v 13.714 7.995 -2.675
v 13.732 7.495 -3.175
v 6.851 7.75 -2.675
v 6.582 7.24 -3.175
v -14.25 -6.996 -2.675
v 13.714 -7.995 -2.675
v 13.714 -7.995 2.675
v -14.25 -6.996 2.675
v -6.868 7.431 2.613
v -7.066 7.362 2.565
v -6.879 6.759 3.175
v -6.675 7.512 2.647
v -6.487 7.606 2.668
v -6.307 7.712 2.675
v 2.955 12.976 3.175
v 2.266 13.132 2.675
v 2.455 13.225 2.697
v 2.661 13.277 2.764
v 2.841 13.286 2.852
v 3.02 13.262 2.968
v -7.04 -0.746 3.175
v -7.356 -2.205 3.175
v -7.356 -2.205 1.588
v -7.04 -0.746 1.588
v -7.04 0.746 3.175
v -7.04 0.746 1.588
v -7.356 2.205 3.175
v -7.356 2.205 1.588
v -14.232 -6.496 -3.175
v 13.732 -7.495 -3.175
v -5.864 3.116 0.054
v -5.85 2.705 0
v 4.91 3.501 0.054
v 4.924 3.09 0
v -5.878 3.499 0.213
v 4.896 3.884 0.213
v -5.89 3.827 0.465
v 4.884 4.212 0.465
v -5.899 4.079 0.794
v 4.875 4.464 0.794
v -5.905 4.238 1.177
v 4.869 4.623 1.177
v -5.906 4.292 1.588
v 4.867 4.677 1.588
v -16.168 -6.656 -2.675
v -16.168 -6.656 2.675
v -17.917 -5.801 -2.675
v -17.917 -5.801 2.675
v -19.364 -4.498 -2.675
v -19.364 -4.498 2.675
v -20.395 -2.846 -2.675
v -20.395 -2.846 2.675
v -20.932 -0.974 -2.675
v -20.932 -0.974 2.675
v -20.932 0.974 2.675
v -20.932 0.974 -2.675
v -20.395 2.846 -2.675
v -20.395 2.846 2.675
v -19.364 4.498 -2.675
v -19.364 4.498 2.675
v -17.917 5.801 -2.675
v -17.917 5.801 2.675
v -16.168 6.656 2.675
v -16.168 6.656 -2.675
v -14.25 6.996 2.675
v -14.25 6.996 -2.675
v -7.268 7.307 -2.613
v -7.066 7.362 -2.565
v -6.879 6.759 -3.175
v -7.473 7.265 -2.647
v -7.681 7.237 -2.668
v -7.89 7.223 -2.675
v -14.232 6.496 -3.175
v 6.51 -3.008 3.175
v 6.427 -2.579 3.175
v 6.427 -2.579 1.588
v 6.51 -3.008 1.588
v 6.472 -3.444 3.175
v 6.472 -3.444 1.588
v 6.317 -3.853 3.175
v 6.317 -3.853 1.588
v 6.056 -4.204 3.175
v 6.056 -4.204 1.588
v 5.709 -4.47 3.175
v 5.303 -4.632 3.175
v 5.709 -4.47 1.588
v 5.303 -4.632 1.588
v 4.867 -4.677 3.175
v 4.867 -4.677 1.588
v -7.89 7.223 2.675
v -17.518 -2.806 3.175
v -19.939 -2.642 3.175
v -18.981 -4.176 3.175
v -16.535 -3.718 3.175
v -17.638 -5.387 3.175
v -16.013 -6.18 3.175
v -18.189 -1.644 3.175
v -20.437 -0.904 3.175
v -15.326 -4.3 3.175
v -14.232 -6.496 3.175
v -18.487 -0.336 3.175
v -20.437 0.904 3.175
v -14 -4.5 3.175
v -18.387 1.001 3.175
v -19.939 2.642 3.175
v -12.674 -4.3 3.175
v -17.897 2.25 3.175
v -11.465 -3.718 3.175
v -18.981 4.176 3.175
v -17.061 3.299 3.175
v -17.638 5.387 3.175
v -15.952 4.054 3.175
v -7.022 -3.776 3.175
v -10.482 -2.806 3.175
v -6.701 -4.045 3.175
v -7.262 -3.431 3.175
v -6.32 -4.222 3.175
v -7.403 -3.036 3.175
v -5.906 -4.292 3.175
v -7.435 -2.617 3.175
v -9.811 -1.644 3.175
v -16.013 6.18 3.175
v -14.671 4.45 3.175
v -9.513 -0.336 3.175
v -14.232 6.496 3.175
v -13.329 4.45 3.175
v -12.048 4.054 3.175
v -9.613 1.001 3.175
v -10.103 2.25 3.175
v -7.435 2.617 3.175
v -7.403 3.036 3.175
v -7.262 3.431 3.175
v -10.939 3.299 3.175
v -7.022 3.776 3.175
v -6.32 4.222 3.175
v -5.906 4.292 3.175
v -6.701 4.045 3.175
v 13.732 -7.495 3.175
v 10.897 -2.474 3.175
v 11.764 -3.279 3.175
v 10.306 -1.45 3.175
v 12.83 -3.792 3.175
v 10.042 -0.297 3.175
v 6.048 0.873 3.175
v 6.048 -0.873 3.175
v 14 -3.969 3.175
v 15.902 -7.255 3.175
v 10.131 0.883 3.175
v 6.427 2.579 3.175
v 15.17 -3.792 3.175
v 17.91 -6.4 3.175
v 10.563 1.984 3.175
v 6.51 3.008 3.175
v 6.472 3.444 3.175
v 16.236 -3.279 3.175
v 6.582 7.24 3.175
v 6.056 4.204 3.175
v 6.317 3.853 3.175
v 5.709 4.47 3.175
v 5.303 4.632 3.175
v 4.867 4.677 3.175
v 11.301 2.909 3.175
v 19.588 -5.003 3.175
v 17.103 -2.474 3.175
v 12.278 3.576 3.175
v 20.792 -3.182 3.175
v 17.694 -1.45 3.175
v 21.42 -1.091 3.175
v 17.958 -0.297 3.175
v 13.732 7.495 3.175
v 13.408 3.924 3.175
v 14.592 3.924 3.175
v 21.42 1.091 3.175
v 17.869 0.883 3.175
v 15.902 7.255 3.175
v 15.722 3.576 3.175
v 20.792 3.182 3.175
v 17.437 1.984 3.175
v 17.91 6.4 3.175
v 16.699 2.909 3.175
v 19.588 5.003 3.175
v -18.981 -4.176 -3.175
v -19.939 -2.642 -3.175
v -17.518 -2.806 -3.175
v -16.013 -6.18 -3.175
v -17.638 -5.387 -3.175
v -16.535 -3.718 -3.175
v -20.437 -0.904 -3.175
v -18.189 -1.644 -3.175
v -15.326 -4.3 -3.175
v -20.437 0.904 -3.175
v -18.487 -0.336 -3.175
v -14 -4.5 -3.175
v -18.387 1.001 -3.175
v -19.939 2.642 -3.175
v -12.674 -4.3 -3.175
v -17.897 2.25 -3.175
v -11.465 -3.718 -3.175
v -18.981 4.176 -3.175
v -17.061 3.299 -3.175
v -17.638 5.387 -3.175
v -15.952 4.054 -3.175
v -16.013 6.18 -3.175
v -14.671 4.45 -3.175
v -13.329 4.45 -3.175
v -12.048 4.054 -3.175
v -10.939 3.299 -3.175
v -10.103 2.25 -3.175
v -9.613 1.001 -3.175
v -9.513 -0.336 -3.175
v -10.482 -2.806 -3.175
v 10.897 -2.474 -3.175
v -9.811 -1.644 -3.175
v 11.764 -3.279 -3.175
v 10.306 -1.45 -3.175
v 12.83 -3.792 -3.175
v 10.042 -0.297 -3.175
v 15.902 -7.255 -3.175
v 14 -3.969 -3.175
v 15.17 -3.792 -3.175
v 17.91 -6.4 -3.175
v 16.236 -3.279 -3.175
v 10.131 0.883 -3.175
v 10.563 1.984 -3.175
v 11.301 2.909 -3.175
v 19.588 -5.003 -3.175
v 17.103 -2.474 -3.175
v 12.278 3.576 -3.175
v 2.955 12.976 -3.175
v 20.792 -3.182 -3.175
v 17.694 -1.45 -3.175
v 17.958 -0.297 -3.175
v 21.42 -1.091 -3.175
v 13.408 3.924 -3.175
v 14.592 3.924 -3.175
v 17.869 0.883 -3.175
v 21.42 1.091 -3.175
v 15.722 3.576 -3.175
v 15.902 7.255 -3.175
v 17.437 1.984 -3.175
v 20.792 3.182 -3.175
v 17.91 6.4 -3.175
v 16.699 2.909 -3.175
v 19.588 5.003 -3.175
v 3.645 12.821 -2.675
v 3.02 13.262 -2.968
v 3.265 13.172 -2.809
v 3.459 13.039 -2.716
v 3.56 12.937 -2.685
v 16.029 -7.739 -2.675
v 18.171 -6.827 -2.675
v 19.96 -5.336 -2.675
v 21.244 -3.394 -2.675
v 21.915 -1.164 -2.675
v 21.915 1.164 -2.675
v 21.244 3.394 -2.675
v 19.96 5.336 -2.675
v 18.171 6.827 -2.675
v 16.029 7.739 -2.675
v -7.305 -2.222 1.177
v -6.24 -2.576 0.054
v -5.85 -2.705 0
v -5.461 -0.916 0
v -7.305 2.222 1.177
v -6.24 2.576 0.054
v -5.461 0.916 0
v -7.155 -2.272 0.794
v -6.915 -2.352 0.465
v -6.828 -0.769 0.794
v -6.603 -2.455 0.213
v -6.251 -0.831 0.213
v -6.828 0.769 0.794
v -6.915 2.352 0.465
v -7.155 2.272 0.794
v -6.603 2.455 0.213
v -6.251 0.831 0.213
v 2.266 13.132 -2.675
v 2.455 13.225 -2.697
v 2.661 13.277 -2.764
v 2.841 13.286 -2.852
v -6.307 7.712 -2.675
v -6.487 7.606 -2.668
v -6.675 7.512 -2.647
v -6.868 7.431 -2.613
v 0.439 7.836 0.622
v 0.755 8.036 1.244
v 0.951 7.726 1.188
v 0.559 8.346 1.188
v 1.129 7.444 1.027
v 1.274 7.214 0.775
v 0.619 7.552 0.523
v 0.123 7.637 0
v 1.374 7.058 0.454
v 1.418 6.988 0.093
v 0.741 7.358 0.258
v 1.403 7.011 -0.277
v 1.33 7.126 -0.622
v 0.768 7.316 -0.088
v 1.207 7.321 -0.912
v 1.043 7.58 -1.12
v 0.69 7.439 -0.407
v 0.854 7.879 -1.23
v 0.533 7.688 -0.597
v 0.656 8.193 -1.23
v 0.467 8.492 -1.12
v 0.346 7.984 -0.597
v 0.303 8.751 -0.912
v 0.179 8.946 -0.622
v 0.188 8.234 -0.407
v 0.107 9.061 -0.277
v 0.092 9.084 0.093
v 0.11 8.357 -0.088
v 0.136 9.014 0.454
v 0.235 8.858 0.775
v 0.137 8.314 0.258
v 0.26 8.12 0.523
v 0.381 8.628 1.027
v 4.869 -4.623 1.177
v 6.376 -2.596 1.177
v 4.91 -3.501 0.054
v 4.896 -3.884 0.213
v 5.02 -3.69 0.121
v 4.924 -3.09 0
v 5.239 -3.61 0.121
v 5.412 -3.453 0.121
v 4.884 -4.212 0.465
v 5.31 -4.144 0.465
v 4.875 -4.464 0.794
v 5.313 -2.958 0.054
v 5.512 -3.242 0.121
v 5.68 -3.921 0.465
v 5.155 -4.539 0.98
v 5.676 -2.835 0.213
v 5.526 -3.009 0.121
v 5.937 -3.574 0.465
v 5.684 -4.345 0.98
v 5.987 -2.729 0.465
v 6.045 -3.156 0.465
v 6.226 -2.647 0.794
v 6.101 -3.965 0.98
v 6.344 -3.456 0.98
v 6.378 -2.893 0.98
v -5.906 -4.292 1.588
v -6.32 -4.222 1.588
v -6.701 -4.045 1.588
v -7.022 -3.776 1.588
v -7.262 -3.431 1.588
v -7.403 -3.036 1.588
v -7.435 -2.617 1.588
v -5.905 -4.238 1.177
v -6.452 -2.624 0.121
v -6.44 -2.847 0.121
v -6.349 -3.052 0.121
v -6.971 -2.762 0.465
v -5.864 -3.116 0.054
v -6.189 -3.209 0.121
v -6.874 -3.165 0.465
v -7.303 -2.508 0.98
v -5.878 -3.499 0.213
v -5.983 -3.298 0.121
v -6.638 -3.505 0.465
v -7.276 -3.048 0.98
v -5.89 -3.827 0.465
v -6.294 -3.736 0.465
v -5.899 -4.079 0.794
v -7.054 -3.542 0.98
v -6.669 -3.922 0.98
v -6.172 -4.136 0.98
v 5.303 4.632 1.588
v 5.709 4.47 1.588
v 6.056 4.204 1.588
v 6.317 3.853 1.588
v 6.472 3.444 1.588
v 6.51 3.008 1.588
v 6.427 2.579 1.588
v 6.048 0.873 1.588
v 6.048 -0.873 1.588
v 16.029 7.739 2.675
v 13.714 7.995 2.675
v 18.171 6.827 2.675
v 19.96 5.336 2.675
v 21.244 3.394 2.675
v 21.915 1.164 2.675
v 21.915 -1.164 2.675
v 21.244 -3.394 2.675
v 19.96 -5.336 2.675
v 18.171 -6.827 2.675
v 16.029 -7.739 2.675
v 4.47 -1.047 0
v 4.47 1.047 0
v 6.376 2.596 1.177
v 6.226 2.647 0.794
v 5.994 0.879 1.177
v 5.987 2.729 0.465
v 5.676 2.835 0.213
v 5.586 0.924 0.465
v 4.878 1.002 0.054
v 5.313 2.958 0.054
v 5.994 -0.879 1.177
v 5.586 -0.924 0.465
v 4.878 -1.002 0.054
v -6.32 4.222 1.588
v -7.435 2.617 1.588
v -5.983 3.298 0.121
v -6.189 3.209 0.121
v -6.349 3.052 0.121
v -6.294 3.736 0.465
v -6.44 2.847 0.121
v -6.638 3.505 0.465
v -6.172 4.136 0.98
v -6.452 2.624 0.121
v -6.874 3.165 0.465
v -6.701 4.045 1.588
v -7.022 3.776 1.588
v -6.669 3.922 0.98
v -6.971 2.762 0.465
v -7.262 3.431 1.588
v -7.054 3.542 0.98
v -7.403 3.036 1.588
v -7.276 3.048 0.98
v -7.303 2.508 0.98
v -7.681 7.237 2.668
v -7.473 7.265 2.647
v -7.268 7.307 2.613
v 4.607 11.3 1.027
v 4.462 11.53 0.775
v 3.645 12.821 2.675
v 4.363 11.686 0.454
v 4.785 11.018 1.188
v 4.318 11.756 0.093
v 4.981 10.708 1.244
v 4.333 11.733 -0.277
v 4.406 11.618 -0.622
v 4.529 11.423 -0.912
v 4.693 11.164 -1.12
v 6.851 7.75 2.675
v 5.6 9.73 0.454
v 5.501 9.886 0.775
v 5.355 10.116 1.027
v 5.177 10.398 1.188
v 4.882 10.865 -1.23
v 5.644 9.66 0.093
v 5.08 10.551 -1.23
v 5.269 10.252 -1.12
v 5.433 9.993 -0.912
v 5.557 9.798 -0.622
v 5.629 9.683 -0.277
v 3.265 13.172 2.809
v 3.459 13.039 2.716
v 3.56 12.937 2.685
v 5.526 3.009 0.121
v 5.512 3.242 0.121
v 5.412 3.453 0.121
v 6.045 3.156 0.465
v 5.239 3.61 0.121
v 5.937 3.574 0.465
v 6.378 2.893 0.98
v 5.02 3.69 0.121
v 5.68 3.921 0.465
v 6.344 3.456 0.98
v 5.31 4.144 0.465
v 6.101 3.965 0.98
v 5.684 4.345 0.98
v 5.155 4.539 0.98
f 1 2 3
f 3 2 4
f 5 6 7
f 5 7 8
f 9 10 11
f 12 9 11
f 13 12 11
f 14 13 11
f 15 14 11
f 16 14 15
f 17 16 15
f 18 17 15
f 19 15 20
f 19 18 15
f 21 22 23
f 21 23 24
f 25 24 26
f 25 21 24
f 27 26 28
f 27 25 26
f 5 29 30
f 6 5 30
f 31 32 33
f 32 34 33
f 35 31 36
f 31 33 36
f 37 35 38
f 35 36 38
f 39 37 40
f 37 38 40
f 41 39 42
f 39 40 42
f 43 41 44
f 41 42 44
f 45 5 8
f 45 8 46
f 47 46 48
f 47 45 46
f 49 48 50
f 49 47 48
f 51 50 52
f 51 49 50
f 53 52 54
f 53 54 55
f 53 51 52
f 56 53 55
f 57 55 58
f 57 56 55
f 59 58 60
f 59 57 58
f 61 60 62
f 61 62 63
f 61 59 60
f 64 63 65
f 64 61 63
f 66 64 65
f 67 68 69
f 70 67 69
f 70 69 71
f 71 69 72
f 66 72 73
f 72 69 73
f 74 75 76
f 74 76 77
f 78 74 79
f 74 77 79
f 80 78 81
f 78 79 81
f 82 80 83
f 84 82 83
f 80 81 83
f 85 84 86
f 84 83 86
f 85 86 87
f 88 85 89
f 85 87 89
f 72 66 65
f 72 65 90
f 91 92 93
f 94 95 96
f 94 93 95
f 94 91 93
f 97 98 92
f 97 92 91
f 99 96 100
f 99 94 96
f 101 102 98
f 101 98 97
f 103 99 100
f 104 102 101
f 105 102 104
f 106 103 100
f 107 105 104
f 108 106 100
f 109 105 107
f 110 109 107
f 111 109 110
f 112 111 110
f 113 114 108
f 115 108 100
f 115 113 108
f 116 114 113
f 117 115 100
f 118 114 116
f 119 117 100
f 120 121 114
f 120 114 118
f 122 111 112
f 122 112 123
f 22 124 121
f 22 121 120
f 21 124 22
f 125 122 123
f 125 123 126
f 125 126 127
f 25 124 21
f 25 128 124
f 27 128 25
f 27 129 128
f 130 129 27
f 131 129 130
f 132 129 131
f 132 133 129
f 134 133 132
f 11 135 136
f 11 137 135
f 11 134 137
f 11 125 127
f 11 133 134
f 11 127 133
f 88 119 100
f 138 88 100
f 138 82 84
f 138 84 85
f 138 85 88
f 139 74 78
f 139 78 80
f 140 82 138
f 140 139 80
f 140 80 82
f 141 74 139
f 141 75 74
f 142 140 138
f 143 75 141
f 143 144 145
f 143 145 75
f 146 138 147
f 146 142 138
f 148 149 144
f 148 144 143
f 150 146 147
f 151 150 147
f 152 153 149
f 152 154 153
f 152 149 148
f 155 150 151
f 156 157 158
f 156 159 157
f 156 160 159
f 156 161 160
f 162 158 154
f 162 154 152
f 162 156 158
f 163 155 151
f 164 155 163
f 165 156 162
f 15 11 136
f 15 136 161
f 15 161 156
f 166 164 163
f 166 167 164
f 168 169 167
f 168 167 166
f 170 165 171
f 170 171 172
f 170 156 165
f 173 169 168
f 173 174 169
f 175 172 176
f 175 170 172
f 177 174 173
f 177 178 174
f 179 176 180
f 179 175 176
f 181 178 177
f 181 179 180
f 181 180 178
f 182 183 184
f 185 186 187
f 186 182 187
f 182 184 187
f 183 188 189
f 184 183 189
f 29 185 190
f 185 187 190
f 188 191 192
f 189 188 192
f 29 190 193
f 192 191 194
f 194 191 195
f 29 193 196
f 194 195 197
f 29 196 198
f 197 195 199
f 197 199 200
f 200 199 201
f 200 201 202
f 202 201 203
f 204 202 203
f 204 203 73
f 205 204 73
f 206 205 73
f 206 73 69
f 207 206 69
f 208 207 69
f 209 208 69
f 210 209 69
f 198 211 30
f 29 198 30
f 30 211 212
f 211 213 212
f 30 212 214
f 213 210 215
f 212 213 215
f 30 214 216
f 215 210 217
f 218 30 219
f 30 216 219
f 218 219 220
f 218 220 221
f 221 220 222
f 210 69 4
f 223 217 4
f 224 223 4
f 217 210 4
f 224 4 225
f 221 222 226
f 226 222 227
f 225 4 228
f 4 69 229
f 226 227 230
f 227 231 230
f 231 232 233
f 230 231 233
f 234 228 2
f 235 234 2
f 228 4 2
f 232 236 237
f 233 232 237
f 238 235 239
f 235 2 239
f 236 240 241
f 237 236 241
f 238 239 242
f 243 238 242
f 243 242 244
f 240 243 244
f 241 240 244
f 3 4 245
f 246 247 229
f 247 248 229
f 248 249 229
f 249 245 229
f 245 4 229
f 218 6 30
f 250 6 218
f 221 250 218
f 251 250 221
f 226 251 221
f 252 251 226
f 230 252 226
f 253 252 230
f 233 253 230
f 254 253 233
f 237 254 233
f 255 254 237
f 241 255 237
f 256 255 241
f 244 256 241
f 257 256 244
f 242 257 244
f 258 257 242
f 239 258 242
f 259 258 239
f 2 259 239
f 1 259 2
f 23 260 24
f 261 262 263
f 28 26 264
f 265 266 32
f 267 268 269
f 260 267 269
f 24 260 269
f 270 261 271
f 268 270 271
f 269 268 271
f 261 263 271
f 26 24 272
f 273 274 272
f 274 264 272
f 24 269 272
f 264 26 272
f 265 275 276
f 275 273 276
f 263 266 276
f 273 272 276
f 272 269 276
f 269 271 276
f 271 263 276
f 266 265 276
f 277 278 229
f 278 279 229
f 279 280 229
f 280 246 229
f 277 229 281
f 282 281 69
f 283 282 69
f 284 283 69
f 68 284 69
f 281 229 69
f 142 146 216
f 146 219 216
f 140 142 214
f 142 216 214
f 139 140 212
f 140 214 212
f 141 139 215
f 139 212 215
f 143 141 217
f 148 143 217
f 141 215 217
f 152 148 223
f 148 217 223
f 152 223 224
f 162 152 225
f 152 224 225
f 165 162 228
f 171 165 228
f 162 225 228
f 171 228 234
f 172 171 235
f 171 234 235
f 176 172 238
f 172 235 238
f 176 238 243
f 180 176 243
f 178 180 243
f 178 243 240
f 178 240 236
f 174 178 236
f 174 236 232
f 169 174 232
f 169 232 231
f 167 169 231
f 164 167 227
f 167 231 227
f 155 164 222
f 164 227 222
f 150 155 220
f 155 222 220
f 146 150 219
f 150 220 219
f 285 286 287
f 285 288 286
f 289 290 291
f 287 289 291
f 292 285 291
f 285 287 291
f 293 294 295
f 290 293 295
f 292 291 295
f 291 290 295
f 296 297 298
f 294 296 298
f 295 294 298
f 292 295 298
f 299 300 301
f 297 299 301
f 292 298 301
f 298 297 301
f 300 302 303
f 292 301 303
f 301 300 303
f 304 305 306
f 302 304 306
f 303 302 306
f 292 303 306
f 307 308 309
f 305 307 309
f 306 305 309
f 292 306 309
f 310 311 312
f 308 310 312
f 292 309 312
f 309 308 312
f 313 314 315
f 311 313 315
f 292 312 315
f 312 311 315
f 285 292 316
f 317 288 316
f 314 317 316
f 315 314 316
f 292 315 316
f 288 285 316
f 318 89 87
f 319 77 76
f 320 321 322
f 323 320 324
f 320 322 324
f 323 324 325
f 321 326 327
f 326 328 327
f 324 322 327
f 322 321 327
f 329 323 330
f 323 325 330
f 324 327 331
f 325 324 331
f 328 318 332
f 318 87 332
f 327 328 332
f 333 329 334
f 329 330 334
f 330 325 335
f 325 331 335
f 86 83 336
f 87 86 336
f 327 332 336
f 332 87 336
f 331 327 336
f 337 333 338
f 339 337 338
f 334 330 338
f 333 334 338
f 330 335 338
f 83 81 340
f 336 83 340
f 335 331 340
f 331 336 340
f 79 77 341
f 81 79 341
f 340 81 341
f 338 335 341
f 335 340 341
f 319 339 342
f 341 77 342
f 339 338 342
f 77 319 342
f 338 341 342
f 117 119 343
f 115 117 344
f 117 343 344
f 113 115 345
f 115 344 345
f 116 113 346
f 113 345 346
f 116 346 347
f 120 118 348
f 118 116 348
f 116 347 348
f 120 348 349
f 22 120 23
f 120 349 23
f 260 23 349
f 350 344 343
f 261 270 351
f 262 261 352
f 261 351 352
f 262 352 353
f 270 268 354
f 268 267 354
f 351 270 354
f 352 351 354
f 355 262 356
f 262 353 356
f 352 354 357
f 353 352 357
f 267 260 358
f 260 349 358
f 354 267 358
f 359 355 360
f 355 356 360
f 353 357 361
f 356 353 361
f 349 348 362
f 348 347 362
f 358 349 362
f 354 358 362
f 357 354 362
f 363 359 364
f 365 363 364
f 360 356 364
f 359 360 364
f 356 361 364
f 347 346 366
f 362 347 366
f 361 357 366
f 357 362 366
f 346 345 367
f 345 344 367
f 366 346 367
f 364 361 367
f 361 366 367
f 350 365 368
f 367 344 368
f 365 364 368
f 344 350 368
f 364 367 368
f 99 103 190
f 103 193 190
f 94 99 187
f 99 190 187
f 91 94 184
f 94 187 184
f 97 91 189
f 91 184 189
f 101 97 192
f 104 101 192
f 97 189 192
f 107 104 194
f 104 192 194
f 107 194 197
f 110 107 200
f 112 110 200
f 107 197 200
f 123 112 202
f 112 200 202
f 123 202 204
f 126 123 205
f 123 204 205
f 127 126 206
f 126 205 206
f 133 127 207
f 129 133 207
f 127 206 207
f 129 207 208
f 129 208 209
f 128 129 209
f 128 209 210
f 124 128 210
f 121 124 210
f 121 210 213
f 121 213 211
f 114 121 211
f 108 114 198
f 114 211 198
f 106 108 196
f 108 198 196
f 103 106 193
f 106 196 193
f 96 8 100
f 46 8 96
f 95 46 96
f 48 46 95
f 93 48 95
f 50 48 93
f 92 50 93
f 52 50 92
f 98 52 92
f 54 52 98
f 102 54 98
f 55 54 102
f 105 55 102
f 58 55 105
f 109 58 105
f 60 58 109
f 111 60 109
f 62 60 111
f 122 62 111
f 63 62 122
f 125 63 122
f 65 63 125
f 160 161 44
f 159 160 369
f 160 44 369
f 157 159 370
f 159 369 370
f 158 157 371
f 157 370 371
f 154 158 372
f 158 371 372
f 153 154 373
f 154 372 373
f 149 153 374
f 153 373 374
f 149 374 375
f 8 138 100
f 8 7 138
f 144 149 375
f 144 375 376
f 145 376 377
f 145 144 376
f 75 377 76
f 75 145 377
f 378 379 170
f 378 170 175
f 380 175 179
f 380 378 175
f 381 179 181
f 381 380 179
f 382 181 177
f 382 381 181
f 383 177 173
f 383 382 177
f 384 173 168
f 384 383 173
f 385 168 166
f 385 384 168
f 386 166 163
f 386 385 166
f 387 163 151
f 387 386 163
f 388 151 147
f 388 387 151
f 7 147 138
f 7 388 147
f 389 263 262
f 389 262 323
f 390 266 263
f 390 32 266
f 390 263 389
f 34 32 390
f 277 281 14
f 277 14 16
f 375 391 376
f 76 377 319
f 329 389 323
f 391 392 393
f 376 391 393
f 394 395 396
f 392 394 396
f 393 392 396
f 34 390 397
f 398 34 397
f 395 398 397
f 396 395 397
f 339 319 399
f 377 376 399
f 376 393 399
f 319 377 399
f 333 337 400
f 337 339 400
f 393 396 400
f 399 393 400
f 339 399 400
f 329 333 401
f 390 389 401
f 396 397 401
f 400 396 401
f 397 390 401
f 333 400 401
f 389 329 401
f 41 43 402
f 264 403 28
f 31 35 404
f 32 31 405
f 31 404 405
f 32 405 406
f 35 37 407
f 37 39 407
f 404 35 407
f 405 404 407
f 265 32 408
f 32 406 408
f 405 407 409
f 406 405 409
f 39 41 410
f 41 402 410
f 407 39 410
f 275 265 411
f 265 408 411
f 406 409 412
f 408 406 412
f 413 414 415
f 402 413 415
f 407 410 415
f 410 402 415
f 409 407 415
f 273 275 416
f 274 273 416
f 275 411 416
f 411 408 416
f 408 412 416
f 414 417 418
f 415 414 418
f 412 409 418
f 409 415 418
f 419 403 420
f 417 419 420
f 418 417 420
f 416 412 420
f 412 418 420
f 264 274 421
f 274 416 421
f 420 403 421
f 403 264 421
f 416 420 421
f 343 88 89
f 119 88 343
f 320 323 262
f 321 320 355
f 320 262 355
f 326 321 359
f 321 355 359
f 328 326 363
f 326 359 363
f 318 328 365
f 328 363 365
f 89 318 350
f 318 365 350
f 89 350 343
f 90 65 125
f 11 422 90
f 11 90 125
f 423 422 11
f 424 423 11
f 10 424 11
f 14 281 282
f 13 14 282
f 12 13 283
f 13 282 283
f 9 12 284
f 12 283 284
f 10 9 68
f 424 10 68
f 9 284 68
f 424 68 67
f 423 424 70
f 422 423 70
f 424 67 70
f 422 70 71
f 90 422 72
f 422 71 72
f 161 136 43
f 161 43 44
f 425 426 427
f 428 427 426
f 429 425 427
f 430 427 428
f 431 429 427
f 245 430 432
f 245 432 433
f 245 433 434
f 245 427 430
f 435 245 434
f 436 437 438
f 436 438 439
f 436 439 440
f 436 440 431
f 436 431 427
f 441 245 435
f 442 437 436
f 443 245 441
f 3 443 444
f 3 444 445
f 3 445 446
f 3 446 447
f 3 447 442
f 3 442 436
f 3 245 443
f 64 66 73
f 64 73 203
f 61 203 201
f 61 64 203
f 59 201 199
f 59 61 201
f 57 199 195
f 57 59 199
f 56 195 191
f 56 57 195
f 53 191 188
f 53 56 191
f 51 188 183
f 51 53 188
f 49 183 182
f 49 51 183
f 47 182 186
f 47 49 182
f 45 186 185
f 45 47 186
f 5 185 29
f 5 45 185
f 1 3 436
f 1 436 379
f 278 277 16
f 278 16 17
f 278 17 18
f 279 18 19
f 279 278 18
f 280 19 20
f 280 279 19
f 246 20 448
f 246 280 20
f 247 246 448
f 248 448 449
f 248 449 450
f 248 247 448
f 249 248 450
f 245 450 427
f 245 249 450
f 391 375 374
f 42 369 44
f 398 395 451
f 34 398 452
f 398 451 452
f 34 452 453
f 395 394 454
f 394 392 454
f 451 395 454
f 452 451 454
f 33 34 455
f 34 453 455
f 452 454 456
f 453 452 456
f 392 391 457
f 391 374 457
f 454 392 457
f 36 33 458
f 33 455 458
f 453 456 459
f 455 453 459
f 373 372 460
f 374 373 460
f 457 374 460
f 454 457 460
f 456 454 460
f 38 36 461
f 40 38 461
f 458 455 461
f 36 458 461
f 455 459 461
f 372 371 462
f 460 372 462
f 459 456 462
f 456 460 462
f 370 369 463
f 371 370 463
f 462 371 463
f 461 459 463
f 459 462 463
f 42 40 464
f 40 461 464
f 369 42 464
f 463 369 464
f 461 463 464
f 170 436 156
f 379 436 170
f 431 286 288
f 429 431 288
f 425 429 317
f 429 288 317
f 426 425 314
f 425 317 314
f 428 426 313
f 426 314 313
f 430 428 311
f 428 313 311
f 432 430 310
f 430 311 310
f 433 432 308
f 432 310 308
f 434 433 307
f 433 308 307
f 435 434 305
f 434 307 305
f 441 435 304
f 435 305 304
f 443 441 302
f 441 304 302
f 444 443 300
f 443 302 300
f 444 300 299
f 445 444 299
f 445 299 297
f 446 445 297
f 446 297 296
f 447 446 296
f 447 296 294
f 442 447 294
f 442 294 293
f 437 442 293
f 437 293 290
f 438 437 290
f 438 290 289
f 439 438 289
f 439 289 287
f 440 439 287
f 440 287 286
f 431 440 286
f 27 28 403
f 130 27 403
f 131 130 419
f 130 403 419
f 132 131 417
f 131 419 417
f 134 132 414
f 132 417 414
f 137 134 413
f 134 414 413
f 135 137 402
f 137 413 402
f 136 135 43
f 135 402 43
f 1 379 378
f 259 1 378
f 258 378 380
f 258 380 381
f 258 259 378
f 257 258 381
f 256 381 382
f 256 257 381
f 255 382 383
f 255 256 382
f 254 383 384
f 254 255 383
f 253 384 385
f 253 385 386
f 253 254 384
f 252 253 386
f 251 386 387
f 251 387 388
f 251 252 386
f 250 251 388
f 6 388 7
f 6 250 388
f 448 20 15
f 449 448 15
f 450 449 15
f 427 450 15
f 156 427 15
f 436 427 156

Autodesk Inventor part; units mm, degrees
ref_plane "YZ Plane" through (0, 0, 0) normal (1, 0, 0) x (0, 1, 0)
ref_plane "XZ Plane" through (0, 0, 0) normal (0, 1, 0) x (-1, 0, 0)
ref_plane "XY Plane" through (0, 0, 0) normal (0, 0, 1) x (1, 0, 0)
sketch "Sketch1" plane through (0, 0, 0) normal (0, 0, 1) x (1, 0, 0)
  line L0 (-14, 0) -> (14, 0) construction
  line L1 (-14.25, 6.9955) -> (13.7143, 7.9949)
  line L2 (13.7143, -7.9949) -> (-14.25, -6.9955)
  arc A0 (-14.25, 6.9955) -> (-14.25, -6.9955) centre (-14, 0) ccw
  arc A1 (13.7143, -7.9949) -> (13.7143, 7.9949) centre (14, 0) ccw
  line L3 (-7.032, 7.2535) -> (3.1108, 13.6663)
  line L4 (3.1108, 13.6663) -> (6.8515, 7.7496)
  line L5 (4.9811, 10.708) -> (-0.0902, 7.5016) construction
  point P0 (0, 0)
  point P1 (0, 0)
  dimension "d0" = 8
  dimension "d1" = 7
  dimension "d2" = 28
  dimension "d3" = 12
  dimension "d4" = 7
  dimension "d5" = 3.5
  dimension "d6" = 14
extrude "Extrusion1" add sketch "Sketch1" along normal mid plane 6.35
hole "Hole1" at (14, 0, 3.175) direction (0, 0, -1) diameter 7.9375 end through all
hole "Hole2" at (-14, 0, 3.175) direction (0, 0, -1) diameter 9 end through all clearance for "Flat Head Machine Screw" size "M8" standard "Ansi Metric M Profile"
sketch "Sketch2" plane through (3.1108, 13.6663, 3.175) normal (0.8452325, 0.5343988, 0) x (0, 0, -1)
  point P0 (3.175, -9.8888)
sketch "Sketch3" plane through (3.1108, 13.6663, 3.175) normal (0.8452325, 0.5343988, 0) x (0, 0, -1)
  line L0 (0, -7) -> (0, 0) construction
  line L1 (0, -3.5) -> (6.35, -3.5) construction
  line L2 (6.35, 0) -> (6.35, -7) construction
  line L3 (6.35, 0) -> (0, 0) construction
  line L4 (3.175, 0) -> (3.175, -7) construction
  line L5 (6.35, -7) -> (0, -7) construction
  point P0 (3.175, -9.8888)
  point P1 (3.175, -3.5)
hole "Hole3" at (4.9811, 10.708, 0) direction (-0.8452325, -0.5343988, 0) diameter 2.487 depth 5 tip angle 118 thread size "5-40 UNC" class "2B" standard "ANSI Unified Screw Threads"
sketch "Sketch4" plane through (0, 0, 3.175) normal (0, 0, 1) x (1, 0, 0)
  circle A0 centre (-14, 0) radius 4.5 projected
  circle A1 centre (14, 0) radius 3.9687 projected
  line L0 (6.8515, 7.7496) -> (3.1108, 13.6663) projected
  line L1 (3.1108, 13.6663) -> (-7.032, 7.2535) projected
  line L2 (-7.032, 7.2535) -> (-14.25, 6.9955) projected
  arc A2 (-14.25, 6.9955) -> (-14.25, -6.9955) centre (-14, 0) ccw projected
  line L3 (-14.25, -6.9955) -> (13.7143, -7.9949) projected
  arc A3 (13.7143, -7.9949) -> (13.7143, 7.9949) centre (14, 0) ccw projected
  line L4 (13.7143, 7.9949) -> (6.8515, 7.7496) projected
  line L5 (7.5804, -4.7738) -> (-8.402, -4.2026)
  arc A4 (-8.402, -4.2026) -> (-8.402, 4.2026) centre (-14, 0) ccw
  arc A5 (7.5804, 4.7738) -> (7.5804, -4.7738) centre (14, 0) ccw
  line L6 (-8.402, 4.2026) -> (7.5804, 4.7738)
  point P0 (0, 0)
  dimension "d35" = 3
  dimension "d36" = 3
extrude "Extrusion2" cut sketch "Sketch4" against normal blind 3.175 contours L5 A4 L6 A5
fillet "Fillet1" radius 1.5875 8 edges at (6, 0, 0) (7.5804, 4.7738, 1.5875) (-0.4108, 4.4882, 0) (-8.402, 4.2026, 1.5875) (-7, 0, 0) (-0.4108, -4.4882, 0) (7.5804, -4.7738, 1.5875) (-8.402, -4.2026, 1.5875)
chamfer "Chamfer1" distance 0.5 angle 45 14 edges at (-1.9606, 10.4599, -3.175) (-1.9606, 10.4599, 3.175) (-10.641, 7.1245, -3.175) (-21, 0, -3.175) (-0.2679, -7.4952, -3.175) (22, 0, -3.175) (10.2829, 7.8723, -3.175) (-10.641, 7.1245, 3.175) (-21, 0, 3.175) (-0.2679, -7.4952, 3.175) (22, 0, 3.175) (10.2829, 7.8723, 3.175) (4.9811, 10.708, -3.175) (4.9811, 10.708, 3.175)
fillet "Fillet2" radius 1 1 edges at (3.1108, 13.6663, 0)
fillet "Fillet3" radius 3.175 1 edges at (-7.032, 7.2535, 0)
properties part number "INVENTOR WORKSHOP"
